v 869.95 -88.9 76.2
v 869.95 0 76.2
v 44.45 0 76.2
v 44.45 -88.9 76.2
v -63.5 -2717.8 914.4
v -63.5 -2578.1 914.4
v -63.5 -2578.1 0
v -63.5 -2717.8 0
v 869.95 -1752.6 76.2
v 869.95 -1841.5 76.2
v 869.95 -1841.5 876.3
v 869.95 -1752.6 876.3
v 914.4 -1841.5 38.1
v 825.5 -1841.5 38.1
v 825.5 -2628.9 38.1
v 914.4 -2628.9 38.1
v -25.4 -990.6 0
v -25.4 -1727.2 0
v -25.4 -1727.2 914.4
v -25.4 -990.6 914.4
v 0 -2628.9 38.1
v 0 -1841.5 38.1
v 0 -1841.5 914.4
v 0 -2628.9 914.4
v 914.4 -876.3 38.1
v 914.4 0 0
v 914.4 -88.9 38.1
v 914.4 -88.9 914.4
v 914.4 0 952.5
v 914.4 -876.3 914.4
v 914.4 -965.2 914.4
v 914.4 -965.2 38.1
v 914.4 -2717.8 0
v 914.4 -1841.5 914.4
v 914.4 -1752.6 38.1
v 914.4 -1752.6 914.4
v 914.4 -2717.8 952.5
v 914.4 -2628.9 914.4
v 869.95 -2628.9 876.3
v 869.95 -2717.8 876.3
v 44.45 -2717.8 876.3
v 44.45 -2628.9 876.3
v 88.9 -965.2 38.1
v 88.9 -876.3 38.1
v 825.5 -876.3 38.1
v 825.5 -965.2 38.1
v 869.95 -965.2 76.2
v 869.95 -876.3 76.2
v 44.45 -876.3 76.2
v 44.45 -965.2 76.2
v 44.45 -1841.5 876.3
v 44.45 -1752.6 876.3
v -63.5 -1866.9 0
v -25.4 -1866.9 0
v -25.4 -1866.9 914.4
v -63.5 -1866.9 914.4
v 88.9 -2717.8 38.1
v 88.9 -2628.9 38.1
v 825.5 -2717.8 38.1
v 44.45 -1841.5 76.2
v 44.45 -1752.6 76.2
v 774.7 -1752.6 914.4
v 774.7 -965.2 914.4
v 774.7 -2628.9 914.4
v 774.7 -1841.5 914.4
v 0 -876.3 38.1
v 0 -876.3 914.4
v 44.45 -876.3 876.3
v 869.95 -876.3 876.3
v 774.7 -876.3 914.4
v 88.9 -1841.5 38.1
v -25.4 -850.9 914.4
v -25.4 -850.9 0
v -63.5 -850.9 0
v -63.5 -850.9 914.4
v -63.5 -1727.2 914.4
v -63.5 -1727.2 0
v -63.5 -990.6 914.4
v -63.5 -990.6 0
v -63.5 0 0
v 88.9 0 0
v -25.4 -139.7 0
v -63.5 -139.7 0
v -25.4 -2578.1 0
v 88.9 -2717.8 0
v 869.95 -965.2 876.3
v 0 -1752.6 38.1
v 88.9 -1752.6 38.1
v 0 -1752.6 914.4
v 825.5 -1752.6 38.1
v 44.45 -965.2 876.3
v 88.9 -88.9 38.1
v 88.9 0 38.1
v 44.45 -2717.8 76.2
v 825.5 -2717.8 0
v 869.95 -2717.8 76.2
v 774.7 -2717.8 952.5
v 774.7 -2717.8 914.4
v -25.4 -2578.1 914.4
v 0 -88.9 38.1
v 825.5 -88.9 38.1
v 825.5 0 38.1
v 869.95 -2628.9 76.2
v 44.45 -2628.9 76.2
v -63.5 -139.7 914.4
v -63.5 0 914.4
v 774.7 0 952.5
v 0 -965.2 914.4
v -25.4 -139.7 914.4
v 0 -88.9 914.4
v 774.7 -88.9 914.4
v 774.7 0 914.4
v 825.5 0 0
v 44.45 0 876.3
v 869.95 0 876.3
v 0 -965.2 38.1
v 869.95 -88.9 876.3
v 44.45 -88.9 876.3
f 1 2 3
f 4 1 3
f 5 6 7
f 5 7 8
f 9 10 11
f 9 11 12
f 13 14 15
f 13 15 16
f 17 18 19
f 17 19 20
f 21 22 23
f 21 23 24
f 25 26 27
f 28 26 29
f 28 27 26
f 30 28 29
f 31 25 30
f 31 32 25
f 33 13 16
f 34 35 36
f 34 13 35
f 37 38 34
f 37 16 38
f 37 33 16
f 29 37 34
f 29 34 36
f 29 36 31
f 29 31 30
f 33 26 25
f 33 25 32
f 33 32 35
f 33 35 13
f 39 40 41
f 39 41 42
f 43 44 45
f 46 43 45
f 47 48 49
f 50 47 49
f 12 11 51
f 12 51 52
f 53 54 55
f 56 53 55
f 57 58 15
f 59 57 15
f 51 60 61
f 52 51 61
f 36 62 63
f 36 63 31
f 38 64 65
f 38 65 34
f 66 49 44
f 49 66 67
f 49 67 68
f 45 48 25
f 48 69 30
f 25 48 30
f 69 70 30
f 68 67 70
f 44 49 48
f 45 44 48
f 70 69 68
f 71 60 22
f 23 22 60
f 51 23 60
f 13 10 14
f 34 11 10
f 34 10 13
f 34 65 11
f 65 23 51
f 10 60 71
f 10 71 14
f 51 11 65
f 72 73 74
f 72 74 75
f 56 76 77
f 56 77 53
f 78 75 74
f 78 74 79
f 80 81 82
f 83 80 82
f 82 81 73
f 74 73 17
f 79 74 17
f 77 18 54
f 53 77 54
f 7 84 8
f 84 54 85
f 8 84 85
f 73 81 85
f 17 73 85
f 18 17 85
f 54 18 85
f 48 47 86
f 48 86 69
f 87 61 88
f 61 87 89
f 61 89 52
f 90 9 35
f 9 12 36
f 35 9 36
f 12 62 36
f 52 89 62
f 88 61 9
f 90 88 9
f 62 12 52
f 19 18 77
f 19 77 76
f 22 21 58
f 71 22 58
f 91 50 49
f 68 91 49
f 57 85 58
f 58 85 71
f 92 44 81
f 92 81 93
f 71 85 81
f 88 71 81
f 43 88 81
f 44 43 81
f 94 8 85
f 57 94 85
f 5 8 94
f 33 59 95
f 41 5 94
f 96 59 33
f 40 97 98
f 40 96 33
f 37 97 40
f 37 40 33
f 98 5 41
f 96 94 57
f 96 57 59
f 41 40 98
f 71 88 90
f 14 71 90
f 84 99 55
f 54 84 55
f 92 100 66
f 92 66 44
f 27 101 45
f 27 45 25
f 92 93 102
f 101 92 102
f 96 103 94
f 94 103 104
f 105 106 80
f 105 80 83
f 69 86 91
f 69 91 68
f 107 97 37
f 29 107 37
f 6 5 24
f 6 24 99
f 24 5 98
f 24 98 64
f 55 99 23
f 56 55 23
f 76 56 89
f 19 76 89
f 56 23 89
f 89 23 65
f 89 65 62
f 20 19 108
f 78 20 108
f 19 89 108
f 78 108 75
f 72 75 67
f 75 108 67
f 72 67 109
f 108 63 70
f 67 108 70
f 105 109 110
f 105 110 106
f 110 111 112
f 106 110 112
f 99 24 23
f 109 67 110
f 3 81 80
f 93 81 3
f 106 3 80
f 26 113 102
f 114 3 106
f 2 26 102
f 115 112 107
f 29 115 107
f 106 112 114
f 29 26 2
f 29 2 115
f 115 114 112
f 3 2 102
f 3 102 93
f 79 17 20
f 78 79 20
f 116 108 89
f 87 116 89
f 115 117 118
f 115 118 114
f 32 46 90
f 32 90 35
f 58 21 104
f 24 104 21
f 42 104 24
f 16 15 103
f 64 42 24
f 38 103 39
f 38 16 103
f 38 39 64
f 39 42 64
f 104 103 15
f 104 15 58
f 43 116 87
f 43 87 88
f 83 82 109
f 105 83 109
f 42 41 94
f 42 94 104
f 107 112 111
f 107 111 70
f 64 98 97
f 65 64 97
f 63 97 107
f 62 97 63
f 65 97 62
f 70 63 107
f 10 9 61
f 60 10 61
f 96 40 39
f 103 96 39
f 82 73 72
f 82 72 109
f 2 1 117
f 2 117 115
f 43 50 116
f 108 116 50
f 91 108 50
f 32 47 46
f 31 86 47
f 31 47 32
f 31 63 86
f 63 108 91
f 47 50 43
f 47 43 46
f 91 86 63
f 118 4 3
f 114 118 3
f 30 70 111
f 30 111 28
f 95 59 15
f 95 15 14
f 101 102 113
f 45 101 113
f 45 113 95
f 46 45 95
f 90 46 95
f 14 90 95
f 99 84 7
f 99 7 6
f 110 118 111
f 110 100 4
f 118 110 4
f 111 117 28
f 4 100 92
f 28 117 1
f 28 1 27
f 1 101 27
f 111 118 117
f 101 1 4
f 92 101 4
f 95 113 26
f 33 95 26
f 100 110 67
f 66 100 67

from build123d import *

# Parameters (mm, degrees)
F1_DEPTH  = 2717.8
F2_W      = 914.4
F2_H      = 787.4
F3_DEPTH  = 38.1
F4_W      = 44.45
F4_H      = 88.9
F5_DEPTH  = 800.1
F6_W      = 88.9
F6_H      = 38.1
F7_DEPTH  = 914.4
F8_W      = 139.7
F8_H      = 38.1
F9_DEPTH  = 2717.8
F10_W     = 139.7
F10_H     = 914.4
F11_DEPTH = 63.5
F12_W     = 25.4
F12_H     = 2717.8
F13_DEPTH = 914.4


with BuildPart() as f1:
    # F0 (on Front) → F1 (new body)
    with BuildSketch(Plane.XZ):
        Polygon((0, 76.2), (0, 0), (88.9, 0), (88.9, 38.1), (825.5, 38.1), (825.5, 0), (914.4, 0), (914.4, 76.2), align=None)
    extrude(amount=F1_DEPTH)

    # F2 (on face) → F3 (cut)
    with BuildSketch(Plane.XY.offset(76.2)):
        with Locations((457.2, -2235.2)):
            Rectangle(F2_W, F2_H)
        with Locations((457.2, -1358.9)):
            Rectangle(F2_W, F2_H)
        with Locations((457.2, -482.6)):
            Rectangle(F2_W, F2_H)
    extrude(amount=-F3_DEPTH, mode=Mode.SUBTRACT)

    # F4 (on face) → F5 (join)
    with BuildSketch(Plane.XY.offset(76.2)):
        with Locations((892.175, -44.45)):
            Rectangle(F4_W, F4_H)
        with Locations((22.225, -44.45)):
            Rectangle(F4_W, F4_H)
        with Locations((22.225, -920.75)):
            Rectangle(F4_W, F4_H)
        with Locations((892.175, -920.75)):
            Rectangle(F4_W, F4_H)
        with Locations((892.175, -1797.05)):
            Rectangle(F4_W, F4_H)
        with Locations((22.225, -1797.05)):
            Rectangle(F4_W, F4_H)
        with Locations((22.225, -2673.35)):
            Rectangle(F4_W, F4_H)
        with Locations((892.175, -2673.35)):
            Rectangle(F4_W, F4_H)
    extrude(amount=F5_DEPTH)

    # F6 (on face) → F7 (join)
    with BuildSketch(Plane.YZ.offset(914.4)):
        with Locations((-2673.35, 895.35)):
            Rectangle(F6_W, F6_H)
        with Locations((-44.45, 895.35)):
            Rectangle(F6_W, F6_H)
        with Locations((-1797.05, 895.35)):
            Rectangle(F6_W, F6_H)
        with Locations((-920.75, 895.35)):
            Rectangle(F6_W, F6_H)
    extrude(amount=-F7_DEPTH)

    # F8 (on face) → F9 (join)
    with BuildSketch(Plane.XZ.offset(2717.8)):
        with Locations((844.55, 933.45)):
            Rectangle(F8_W, F8_H)
    extrude(amount=-F9_DEPTH)

    # F10 (on face) → F11 (join)
    with BuildSketch(Plane(origin=(0, 0, 0), x_dir=(0, -1, 0), z_dir=(-1, 0, 0))):
        with Locations((69.85, 457.2)):
            Rectangle(F10_W, F10_H)
        with Locations((2647.95, 457.2)):
            Rectangle(F10_W, F10_H)
        with Locations((920.75, 457.2)):
            Rectangle(F10_W, F10_H)
        with Locations((1797.05, 457.2)):
            Rectangle(F10_W, F10_H)
    extrude(amount=F11_DEPTH)

    # F12 (on face) → F13 (join)
    with BuildSketch(Plane.XY.offset(914.4)):
        with Locations((-12.7, -1358.9)):
            Rectangle(F12_W, F12_H)
    extrude(amount=-F13_DEPTH)


solid = f1.part
